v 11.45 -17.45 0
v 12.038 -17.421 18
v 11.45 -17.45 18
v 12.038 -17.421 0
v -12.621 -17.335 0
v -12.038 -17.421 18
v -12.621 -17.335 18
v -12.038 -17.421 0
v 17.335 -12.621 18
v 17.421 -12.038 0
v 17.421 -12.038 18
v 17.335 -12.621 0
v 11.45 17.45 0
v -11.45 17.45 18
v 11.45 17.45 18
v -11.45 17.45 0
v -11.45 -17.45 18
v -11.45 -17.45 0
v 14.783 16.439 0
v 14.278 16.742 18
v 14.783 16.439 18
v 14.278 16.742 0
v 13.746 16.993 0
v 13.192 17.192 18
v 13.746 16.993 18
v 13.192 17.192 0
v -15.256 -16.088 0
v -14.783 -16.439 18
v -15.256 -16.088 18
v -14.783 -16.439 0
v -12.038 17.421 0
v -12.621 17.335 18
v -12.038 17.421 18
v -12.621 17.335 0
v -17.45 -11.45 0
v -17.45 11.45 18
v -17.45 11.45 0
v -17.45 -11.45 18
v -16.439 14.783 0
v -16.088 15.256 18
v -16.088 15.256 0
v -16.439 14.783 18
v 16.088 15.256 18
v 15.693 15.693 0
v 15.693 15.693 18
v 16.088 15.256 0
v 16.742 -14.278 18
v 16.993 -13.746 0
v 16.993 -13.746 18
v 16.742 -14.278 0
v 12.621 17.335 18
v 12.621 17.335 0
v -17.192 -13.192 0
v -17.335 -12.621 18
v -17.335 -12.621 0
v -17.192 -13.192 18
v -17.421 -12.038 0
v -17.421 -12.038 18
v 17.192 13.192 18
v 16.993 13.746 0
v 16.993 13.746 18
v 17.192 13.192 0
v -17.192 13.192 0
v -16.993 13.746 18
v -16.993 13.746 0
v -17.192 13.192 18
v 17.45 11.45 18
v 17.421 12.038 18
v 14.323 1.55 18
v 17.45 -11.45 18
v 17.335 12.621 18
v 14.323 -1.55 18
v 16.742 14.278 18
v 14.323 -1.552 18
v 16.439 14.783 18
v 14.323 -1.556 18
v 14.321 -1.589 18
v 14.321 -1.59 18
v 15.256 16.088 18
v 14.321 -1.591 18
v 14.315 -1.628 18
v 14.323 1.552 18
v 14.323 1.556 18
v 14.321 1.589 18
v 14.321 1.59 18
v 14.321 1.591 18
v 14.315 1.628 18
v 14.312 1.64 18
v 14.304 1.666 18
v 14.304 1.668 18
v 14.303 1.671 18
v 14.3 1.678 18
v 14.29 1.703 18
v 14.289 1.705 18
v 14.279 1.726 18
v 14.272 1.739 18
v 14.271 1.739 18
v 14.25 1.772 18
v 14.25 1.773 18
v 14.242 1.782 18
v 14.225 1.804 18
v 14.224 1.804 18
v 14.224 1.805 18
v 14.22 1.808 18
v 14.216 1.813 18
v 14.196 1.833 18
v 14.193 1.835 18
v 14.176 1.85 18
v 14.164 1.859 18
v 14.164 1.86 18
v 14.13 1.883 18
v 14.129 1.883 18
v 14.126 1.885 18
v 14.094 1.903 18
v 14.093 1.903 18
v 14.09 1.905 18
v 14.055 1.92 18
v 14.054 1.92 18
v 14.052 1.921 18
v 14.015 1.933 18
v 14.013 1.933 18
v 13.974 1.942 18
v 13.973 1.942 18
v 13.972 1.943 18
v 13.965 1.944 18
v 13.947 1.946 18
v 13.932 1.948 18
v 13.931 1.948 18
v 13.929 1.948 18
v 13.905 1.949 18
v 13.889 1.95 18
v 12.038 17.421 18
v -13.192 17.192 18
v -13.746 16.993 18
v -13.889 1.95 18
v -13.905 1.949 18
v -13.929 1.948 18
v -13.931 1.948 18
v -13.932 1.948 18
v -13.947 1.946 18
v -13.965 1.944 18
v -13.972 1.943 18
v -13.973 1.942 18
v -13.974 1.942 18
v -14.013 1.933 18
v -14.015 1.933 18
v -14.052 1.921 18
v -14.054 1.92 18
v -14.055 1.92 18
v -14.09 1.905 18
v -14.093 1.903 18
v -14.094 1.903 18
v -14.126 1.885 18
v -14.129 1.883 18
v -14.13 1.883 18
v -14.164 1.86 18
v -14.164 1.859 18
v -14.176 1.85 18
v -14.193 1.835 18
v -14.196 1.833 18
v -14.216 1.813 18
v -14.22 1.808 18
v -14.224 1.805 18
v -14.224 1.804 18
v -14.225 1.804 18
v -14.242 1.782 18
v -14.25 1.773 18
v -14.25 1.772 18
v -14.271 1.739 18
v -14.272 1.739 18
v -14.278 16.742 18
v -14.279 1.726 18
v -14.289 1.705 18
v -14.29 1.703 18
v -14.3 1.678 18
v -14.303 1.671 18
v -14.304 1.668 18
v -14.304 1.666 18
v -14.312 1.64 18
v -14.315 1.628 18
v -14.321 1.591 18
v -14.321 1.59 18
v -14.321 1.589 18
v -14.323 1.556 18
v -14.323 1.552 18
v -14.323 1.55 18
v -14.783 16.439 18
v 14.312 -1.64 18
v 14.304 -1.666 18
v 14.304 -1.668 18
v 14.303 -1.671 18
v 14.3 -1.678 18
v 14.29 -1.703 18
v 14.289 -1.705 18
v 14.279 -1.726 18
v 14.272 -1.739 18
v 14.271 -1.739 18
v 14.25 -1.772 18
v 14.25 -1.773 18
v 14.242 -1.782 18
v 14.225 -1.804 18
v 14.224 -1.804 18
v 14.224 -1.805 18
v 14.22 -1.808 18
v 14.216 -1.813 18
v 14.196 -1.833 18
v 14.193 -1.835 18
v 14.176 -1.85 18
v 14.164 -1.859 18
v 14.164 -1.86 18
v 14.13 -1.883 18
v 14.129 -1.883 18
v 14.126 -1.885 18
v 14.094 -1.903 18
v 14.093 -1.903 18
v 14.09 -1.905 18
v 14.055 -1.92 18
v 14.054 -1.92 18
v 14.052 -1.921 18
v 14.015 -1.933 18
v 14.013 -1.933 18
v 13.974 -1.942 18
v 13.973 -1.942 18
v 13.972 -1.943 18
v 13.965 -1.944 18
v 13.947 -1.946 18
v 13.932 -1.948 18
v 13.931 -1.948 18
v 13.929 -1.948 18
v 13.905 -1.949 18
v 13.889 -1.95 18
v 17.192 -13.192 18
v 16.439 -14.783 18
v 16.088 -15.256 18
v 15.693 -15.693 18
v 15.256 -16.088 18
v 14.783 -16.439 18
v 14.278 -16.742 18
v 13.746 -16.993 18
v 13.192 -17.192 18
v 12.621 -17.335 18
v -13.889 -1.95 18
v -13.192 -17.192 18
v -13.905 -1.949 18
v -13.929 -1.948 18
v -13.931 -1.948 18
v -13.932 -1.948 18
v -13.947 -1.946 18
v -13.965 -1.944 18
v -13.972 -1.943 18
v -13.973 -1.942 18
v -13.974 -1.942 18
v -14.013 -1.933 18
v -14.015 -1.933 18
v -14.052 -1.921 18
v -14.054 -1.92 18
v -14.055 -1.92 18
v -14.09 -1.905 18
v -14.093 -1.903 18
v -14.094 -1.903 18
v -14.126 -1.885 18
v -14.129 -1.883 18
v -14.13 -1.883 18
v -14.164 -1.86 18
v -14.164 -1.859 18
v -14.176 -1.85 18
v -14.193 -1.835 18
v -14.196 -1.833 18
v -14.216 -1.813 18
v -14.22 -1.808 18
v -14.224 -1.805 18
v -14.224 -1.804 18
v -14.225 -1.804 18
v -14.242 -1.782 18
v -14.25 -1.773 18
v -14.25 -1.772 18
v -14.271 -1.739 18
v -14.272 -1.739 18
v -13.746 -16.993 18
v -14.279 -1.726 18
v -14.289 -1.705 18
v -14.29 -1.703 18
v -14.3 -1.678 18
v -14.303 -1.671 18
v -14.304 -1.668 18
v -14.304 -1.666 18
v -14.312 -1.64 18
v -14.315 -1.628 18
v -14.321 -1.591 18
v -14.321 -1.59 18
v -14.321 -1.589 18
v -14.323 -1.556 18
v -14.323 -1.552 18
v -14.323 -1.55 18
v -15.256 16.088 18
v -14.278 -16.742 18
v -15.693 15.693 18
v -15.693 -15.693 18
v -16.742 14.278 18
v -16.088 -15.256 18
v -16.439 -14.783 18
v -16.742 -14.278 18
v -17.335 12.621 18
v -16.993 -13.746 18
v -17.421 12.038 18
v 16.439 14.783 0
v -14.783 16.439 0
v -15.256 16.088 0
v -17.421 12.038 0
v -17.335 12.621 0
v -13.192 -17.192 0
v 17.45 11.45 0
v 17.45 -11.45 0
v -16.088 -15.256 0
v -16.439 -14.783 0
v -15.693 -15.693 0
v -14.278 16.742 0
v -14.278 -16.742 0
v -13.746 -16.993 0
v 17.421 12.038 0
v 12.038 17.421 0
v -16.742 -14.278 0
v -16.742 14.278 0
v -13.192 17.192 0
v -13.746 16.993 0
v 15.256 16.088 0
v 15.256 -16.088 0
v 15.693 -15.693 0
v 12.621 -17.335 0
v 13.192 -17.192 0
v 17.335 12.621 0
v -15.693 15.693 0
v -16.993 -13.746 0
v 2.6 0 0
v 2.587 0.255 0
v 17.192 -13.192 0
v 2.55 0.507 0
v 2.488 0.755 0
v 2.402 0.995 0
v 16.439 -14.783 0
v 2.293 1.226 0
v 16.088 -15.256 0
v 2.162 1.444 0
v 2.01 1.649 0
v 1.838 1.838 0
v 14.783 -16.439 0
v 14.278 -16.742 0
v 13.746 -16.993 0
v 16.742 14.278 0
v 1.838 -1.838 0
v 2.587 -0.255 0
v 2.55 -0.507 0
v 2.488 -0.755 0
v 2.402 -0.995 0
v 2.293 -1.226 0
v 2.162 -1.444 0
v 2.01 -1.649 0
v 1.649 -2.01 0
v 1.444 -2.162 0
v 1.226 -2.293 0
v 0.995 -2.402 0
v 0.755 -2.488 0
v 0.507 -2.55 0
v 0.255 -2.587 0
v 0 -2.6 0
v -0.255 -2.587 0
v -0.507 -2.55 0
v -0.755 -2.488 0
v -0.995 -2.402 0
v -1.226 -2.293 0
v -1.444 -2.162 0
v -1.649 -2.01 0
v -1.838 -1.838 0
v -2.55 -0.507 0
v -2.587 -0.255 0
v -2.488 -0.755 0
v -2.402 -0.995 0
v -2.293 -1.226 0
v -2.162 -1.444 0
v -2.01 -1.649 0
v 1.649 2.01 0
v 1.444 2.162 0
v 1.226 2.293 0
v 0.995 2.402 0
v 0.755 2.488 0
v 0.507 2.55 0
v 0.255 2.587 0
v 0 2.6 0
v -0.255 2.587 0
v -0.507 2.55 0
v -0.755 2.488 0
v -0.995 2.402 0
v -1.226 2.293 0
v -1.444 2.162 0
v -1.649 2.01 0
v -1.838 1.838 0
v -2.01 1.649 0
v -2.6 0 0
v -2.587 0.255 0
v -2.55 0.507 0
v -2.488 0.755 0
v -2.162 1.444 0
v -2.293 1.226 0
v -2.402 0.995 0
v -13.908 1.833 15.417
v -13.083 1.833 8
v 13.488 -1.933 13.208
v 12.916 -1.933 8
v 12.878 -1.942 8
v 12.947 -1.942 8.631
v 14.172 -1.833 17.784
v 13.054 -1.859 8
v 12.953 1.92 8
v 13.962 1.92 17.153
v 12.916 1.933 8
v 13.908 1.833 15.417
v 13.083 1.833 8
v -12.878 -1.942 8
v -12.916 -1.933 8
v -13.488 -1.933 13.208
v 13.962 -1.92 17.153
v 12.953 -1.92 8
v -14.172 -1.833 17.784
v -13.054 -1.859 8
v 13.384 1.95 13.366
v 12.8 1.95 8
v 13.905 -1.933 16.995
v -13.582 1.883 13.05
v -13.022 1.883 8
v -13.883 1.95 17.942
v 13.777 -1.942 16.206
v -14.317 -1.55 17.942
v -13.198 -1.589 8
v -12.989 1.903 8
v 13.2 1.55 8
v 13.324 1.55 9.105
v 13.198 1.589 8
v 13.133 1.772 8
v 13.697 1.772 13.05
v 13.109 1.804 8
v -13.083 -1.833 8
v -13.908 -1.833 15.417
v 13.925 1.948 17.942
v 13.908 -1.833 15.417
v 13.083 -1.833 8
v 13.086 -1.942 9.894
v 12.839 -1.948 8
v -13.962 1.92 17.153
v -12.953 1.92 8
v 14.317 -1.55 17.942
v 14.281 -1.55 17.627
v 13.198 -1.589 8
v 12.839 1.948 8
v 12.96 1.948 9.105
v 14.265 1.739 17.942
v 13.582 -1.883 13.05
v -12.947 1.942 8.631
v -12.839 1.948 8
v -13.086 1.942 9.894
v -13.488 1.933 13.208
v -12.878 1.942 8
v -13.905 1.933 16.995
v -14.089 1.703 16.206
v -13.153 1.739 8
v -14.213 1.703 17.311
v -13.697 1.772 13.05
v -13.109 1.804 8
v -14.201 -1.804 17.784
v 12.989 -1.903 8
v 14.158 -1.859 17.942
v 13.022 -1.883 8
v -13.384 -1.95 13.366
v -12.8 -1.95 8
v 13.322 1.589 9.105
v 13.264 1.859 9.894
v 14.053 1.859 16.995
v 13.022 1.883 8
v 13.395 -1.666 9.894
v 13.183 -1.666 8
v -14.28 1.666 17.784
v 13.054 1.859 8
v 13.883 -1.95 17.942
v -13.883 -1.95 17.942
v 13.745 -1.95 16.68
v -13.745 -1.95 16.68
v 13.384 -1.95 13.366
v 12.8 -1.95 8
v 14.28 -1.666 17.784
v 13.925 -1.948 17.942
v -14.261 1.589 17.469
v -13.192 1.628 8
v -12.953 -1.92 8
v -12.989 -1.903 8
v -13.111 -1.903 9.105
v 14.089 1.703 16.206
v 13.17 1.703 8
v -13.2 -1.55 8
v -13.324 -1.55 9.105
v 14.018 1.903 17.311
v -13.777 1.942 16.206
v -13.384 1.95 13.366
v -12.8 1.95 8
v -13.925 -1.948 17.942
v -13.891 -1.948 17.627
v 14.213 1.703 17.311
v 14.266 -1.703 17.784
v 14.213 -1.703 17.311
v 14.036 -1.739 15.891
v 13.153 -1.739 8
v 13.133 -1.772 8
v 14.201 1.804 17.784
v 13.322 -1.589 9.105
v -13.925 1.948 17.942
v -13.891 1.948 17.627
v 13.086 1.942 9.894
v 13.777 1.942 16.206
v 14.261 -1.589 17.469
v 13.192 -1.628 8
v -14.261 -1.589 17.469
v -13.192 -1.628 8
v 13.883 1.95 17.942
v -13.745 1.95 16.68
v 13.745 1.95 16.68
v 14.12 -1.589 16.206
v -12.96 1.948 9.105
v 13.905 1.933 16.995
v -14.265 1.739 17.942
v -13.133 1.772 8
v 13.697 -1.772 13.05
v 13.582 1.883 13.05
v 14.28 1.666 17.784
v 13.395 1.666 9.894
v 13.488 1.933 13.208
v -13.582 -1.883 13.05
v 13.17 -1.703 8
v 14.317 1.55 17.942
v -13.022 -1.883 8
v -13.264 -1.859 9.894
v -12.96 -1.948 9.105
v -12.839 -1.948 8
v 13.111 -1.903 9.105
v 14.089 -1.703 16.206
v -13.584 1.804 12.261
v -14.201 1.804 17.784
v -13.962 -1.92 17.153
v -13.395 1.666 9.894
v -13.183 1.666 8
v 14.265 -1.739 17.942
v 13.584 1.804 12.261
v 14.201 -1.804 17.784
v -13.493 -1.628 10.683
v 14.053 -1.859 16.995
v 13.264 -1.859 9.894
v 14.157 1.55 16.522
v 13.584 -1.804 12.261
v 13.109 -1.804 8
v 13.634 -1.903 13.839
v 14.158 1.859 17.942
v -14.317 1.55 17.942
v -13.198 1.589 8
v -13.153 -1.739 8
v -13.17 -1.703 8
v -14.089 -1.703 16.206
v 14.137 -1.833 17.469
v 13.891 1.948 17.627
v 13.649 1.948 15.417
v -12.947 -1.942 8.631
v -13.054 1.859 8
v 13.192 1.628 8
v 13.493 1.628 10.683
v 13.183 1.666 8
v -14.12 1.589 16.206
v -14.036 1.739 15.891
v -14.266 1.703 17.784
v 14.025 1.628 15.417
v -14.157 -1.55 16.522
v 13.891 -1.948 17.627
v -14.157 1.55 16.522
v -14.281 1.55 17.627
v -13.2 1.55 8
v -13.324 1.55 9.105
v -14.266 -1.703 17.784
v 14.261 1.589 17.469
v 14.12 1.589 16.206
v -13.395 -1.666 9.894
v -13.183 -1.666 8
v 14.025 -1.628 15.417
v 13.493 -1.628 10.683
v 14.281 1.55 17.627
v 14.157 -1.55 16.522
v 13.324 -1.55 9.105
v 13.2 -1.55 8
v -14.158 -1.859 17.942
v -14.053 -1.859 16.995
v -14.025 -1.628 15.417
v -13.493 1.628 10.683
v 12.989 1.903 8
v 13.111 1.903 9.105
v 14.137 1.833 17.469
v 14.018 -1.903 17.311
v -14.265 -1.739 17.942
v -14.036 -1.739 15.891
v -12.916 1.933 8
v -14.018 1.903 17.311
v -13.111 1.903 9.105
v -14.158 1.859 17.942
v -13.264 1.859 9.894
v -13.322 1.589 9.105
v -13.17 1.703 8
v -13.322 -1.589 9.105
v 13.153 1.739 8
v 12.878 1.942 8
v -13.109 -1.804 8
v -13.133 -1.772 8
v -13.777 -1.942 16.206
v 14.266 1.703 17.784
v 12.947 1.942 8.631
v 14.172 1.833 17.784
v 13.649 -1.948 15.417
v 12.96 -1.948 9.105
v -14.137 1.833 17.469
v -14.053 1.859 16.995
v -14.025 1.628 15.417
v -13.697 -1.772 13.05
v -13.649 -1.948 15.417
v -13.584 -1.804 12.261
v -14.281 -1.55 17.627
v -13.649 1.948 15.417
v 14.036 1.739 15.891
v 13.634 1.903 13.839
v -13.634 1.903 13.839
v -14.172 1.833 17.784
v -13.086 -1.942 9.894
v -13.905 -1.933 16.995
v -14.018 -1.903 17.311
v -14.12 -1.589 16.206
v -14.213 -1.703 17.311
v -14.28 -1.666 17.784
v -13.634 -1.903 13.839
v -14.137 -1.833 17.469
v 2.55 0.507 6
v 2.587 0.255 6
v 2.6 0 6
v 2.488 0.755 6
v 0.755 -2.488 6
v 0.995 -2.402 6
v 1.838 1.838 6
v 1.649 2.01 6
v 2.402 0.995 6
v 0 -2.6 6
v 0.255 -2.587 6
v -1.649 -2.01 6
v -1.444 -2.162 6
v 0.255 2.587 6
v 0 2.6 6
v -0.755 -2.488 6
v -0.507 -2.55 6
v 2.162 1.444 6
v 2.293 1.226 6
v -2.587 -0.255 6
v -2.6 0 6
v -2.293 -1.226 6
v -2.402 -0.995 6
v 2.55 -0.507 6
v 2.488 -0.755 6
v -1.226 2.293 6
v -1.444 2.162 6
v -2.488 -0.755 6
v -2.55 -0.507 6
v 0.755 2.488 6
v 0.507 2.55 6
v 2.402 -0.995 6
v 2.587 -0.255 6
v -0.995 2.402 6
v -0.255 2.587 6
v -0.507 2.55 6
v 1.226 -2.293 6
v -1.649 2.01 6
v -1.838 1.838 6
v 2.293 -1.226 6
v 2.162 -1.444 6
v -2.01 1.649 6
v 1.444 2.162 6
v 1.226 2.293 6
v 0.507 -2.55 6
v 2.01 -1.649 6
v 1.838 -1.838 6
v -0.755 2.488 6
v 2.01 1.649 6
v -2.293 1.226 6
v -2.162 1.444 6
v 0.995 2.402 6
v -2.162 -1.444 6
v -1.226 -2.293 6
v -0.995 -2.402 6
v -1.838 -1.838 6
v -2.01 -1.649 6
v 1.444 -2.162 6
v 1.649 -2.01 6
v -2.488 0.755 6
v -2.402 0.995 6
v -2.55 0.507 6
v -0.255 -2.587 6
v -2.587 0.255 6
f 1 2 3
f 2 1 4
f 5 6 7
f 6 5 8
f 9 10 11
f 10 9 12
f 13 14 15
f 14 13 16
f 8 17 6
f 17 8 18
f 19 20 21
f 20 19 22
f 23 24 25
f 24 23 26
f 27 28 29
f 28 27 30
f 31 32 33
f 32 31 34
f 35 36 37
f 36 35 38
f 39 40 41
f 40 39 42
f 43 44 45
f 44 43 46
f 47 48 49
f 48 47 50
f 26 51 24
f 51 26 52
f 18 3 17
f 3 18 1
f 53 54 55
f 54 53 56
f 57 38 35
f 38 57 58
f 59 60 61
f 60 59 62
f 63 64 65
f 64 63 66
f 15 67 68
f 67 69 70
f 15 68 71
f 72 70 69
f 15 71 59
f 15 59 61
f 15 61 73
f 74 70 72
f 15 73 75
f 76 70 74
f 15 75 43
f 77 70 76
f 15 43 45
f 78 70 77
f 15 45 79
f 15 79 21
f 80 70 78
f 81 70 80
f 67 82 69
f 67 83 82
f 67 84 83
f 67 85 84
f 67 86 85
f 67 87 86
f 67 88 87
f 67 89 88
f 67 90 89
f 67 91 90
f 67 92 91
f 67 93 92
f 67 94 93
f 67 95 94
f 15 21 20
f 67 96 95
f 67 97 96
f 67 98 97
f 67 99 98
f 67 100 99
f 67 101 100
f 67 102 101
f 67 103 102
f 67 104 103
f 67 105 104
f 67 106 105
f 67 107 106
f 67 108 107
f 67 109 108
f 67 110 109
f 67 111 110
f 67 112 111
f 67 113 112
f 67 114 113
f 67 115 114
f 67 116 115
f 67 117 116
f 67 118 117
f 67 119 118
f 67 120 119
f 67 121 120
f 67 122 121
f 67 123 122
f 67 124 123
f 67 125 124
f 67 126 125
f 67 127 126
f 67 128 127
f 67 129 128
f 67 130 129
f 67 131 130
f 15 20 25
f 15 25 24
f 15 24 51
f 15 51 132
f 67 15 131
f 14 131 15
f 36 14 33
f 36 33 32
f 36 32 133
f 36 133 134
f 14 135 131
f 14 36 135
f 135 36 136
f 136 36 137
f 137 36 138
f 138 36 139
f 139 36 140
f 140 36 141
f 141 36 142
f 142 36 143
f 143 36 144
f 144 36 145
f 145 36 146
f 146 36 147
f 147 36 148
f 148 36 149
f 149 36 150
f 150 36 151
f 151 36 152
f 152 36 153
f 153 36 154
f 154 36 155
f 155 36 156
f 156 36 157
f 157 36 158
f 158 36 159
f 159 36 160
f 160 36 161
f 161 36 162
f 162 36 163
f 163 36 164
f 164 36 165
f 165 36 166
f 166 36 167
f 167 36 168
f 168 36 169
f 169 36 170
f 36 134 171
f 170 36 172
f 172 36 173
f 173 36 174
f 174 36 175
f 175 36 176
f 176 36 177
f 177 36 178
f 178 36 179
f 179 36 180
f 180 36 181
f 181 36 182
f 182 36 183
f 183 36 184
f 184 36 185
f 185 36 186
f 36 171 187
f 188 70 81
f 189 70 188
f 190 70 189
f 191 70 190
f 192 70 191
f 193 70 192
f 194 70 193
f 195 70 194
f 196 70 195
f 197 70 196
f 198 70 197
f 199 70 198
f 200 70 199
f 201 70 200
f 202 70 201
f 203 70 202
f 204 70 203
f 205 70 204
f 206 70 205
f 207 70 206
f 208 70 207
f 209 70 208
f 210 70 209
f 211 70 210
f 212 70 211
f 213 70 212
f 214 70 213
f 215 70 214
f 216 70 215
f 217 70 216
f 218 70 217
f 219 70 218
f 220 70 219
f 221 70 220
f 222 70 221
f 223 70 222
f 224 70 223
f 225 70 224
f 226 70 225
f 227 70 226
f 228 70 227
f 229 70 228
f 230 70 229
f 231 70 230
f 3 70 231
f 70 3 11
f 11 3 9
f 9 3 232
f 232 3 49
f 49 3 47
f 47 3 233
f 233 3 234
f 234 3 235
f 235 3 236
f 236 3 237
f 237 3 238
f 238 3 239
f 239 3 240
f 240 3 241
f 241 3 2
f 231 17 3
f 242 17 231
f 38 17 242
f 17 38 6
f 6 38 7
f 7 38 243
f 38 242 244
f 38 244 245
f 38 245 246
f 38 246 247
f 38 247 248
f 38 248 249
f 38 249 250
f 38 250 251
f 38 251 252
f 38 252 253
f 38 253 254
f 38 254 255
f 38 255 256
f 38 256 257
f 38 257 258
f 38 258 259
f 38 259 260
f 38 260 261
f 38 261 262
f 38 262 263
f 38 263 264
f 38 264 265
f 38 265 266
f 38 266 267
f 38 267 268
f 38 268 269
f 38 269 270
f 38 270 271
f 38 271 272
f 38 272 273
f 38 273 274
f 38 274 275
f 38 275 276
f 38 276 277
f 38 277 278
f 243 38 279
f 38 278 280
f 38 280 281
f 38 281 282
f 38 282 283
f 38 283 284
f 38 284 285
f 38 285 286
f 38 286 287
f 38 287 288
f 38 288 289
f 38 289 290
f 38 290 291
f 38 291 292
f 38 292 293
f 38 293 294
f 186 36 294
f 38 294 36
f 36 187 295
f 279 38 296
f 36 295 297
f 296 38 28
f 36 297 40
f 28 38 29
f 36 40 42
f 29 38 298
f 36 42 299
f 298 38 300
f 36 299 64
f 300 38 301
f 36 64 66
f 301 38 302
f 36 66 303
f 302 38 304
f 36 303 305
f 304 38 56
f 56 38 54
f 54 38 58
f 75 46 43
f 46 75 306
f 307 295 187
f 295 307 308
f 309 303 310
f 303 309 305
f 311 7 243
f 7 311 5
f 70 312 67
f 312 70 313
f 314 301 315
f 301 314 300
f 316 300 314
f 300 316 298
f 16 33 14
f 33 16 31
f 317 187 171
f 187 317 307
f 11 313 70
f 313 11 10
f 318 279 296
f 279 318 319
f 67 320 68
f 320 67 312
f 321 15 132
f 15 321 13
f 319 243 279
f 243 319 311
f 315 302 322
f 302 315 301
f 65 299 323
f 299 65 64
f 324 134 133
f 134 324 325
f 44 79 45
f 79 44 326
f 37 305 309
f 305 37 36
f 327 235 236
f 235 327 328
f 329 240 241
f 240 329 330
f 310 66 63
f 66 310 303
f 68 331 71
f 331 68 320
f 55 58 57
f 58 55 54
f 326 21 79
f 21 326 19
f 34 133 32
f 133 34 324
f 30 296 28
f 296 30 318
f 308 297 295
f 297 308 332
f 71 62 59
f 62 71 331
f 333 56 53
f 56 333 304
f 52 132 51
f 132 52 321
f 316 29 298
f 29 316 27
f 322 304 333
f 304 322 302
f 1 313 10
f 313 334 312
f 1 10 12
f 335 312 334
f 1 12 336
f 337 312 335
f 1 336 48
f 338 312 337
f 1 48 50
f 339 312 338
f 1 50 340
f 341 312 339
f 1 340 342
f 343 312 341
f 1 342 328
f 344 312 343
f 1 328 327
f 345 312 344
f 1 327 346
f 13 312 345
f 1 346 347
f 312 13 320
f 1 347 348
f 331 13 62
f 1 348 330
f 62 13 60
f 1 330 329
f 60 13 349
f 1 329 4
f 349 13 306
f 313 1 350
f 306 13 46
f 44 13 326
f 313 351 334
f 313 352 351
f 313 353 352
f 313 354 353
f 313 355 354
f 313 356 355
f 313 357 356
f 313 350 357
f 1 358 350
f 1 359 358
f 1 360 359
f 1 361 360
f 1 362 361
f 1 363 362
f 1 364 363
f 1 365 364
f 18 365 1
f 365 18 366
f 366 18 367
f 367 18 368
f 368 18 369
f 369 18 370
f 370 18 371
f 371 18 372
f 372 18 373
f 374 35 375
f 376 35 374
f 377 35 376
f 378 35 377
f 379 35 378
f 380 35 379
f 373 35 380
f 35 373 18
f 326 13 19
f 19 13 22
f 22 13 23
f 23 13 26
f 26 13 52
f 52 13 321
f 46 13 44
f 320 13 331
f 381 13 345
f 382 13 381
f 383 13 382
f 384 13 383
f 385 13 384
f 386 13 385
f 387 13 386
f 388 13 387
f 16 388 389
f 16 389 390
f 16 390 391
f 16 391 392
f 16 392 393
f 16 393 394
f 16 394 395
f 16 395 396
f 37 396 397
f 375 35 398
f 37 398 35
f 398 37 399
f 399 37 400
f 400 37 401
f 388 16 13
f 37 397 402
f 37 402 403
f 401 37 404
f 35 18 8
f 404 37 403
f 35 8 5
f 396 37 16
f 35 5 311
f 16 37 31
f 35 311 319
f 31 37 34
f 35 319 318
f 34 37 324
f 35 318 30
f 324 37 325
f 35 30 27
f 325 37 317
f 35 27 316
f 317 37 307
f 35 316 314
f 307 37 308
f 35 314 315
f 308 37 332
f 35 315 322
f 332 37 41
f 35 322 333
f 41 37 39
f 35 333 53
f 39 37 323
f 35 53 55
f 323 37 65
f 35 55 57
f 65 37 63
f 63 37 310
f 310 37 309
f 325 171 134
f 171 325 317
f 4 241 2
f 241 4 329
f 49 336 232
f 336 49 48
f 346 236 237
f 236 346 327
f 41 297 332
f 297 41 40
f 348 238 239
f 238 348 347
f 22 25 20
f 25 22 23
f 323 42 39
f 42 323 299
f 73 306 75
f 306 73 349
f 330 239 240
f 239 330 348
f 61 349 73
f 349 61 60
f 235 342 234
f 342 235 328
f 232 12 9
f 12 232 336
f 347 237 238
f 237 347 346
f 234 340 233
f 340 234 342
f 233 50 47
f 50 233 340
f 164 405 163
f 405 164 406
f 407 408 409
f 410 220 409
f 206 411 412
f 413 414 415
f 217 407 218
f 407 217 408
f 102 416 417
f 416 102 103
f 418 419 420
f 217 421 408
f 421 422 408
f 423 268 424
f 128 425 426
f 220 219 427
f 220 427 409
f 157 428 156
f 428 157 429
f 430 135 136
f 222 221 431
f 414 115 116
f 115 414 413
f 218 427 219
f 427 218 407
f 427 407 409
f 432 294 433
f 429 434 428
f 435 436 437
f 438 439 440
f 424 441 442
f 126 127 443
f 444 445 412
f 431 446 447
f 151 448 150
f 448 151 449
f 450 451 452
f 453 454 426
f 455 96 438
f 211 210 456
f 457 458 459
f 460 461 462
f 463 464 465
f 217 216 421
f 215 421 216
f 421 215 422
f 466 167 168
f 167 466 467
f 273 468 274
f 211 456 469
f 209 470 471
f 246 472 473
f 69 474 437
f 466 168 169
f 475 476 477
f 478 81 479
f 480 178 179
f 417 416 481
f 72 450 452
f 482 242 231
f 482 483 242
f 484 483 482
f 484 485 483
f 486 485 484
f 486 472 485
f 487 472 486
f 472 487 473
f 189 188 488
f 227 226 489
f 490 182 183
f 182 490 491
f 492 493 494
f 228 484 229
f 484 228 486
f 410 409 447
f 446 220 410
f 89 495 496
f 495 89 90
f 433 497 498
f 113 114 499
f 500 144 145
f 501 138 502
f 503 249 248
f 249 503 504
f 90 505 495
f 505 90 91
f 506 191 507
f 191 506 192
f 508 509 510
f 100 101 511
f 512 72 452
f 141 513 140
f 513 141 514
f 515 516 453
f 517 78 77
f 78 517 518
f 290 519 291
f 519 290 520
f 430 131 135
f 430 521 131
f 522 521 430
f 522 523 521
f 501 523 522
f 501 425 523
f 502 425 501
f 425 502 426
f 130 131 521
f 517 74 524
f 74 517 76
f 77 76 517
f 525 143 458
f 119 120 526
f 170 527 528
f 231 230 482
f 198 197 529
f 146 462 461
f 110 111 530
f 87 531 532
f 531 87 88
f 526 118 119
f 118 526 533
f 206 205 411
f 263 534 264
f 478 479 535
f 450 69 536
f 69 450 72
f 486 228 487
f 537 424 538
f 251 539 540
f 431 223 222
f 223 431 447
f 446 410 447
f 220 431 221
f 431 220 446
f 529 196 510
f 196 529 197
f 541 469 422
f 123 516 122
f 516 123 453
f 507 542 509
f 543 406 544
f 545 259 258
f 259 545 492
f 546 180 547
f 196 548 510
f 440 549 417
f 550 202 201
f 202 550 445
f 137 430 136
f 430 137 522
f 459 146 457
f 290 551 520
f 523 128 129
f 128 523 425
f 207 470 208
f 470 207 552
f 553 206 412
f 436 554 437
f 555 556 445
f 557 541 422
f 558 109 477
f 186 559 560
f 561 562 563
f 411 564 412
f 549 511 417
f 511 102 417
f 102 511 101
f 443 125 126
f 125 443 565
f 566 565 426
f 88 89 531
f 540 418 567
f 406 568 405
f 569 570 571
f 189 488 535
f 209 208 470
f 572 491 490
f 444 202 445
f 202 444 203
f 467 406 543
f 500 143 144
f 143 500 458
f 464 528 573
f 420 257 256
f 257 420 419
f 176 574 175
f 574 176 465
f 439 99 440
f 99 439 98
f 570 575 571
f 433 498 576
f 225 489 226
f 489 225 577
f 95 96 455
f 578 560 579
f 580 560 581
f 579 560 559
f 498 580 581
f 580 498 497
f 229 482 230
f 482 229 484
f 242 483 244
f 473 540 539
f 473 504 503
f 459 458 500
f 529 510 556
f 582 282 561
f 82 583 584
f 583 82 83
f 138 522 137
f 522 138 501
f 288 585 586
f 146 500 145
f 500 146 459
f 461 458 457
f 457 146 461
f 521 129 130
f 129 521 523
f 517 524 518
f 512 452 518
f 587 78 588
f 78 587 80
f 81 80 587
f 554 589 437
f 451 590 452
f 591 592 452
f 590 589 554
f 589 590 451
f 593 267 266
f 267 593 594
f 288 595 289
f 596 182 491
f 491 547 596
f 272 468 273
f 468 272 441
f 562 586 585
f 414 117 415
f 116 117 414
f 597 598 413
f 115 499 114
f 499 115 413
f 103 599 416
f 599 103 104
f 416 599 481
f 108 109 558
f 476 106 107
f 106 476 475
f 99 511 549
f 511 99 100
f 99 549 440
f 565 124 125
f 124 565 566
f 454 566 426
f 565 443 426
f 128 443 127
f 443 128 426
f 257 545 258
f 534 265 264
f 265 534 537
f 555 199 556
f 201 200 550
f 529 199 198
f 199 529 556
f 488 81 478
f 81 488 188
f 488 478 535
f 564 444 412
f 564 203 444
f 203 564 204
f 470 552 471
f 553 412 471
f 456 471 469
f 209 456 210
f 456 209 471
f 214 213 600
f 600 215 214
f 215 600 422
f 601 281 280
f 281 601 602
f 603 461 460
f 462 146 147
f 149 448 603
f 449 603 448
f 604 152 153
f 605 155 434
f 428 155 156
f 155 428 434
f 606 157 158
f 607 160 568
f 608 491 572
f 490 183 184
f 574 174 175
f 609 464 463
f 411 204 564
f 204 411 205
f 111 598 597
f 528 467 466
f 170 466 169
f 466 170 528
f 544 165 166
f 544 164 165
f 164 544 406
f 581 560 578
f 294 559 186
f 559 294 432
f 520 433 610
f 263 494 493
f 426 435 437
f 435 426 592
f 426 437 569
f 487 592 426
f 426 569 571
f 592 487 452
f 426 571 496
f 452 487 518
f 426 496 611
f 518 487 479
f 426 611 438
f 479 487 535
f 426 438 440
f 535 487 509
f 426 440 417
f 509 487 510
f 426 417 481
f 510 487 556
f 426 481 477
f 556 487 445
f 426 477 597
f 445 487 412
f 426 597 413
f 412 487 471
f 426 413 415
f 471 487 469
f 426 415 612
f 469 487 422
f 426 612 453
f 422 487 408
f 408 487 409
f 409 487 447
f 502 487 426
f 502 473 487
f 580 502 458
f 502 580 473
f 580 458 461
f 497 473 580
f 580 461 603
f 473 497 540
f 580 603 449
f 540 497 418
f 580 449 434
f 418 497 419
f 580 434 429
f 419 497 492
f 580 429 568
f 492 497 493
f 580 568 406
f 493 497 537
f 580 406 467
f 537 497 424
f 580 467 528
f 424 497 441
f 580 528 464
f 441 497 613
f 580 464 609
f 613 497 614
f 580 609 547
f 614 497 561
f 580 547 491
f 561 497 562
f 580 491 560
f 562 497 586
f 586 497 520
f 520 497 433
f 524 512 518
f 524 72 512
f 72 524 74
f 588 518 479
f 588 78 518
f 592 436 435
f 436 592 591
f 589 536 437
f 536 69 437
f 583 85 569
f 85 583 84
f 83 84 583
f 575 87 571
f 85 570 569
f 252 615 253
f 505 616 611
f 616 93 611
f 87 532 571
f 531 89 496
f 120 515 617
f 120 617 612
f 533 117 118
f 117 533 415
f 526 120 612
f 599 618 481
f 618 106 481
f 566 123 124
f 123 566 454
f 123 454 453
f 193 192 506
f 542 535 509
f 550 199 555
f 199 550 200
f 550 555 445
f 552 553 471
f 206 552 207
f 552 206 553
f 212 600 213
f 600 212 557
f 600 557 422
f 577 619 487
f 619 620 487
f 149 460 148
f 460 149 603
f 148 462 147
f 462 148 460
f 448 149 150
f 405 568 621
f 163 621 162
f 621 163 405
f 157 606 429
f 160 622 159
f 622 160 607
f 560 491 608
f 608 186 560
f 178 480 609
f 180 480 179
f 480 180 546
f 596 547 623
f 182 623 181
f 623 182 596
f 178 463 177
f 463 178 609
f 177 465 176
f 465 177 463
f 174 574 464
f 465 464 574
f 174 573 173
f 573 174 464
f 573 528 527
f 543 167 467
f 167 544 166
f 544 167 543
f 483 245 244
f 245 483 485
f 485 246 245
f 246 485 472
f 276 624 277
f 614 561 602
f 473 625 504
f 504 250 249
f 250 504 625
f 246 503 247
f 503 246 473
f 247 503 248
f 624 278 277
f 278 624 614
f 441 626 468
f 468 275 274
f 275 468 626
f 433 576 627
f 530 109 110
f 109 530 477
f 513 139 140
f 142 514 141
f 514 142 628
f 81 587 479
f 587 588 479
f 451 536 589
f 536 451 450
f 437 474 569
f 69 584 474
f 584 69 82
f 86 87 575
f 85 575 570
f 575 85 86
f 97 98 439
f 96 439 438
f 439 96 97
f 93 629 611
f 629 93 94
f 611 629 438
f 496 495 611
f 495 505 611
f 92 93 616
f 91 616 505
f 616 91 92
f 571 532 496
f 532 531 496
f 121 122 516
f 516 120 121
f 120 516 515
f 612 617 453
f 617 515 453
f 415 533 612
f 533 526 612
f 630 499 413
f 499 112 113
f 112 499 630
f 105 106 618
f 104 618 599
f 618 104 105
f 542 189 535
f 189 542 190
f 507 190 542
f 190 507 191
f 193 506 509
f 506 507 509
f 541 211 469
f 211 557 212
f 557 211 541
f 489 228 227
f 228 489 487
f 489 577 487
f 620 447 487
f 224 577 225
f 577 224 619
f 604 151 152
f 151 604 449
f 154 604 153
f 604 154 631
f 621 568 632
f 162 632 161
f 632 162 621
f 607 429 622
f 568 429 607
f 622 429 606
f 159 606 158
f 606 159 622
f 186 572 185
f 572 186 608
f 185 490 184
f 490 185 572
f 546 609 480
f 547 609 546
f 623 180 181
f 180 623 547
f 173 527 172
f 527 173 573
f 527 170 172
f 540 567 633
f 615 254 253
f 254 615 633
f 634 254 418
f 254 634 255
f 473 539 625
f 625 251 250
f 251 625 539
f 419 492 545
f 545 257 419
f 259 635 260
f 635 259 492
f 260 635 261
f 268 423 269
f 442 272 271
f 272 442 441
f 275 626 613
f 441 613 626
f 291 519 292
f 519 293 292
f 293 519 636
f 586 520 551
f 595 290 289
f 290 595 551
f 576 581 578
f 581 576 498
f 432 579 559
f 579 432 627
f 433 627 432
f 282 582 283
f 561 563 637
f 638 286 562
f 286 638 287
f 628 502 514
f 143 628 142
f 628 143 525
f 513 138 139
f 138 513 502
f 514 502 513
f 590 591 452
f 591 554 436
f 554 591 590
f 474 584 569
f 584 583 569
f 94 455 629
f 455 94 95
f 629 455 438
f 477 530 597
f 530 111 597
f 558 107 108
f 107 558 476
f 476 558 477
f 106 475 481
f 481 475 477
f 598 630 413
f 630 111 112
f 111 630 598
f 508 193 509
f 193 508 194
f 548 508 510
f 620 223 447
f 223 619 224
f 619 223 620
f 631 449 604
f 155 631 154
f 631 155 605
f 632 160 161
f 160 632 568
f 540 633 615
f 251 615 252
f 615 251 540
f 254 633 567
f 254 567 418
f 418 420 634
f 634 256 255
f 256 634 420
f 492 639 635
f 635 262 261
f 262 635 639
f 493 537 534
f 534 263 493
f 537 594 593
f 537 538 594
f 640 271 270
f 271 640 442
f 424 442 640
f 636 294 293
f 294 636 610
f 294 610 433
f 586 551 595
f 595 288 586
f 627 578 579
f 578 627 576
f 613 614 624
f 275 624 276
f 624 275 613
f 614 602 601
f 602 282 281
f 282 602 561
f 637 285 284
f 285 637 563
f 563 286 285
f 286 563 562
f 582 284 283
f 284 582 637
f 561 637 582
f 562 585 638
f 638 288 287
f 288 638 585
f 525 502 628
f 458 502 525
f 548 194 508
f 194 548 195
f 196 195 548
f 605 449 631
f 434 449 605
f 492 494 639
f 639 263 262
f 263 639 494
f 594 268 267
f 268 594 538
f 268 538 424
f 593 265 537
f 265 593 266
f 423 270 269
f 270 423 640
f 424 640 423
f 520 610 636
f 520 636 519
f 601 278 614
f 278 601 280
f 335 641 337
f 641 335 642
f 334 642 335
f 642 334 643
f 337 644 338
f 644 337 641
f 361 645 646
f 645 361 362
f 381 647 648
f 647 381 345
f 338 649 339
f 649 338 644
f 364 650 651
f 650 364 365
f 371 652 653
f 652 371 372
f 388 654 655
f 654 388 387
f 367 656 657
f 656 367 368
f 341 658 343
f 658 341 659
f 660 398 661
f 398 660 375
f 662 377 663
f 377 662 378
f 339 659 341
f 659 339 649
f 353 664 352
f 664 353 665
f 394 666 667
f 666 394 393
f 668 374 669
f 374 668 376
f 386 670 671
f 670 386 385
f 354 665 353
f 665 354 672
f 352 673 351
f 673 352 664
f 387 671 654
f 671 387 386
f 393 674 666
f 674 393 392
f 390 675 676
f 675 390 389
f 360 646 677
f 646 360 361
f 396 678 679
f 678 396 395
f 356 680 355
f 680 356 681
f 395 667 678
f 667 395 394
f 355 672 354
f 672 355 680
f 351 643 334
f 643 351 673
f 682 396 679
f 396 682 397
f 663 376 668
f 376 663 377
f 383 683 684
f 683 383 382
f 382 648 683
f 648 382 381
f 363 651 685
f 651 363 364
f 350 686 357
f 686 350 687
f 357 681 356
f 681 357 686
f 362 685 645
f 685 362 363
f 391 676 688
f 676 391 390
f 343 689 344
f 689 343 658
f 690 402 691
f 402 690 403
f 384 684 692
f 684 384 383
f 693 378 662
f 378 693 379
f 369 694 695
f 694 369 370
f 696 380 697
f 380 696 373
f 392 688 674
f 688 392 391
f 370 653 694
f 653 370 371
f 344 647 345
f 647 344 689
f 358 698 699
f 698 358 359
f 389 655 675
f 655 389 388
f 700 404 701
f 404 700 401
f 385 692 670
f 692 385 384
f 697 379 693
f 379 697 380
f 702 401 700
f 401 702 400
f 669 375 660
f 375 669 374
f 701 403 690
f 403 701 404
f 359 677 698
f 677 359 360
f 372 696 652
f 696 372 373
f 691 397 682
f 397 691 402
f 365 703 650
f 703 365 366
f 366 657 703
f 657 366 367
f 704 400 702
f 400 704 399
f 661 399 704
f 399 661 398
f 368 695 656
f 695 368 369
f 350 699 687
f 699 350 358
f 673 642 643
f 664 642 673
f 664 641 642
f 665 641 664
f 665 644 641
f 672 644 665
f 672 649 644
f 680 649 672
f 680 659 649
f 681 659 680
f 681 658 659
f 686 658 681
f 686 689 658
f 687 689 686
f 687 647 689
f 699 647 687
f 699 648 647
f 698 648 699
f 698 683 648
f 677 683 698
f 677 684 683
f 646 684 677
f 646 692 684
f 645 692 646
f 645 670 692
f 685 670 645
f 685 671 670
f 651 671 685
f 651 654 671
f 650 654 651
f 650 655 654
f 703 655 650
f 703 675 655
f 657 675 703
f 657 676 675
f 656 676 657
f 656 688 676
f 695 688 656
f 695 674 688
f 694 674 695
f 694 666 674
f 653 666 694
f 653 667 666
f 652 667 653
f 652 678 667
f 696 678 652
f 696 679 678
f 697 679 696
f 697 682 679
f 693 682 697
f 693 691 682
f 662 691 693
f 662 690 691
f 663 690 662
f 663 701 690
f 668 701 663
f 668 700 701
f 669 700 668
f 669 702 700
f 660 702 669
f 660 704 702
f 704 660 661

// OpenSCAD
// file: socket.scad
include <params.scad>

// Thumb-turn socket. Knob pocket on top (+Z) tapers from the tip (deep) to the
// base (opening); servo shaft bore on the bottom (-Z).
module thumbturn_socket() {
  c   = fit_clearance;
  ow  = knob_w_base + knob_t + 2*socket_wall;   // outer footprint (use widest)
  oh  = knob_engage + socket_wall + 6;          // total height incl. shaft collar
  difference() {
    // outer body: rounded square prism (R=6 for pedestal clearance)
    linear_extrude(height = oh)
      offset(r = 6) offset(r = -6)
        square([ow, ow], center = true);
    // tapered knob pocket: base (knob_w_base) at the top opening, narrowing to
    // the tip (knob_w_top) at depth. Built tip-square at bottom, scaled up to base.
    translate([0, 0, oh - knob_engage])
      linear_extrude(height = knob_engage + 0.1, scale = [knob_w_base/knob_w_top, 1])
        offset(r = c) square([knob_w_top, knob_t], center = true);
    // servo shaft bore (bottom)
    translate([0, 0, -0.1])
      cylinder(d = servo_shaft_d + c, h = 6 + 0.1);
  }
}
// main file
include <params.scad>
use <socket.scad>
// outer footprint must exceed the widest knob dimension with positive walls
assert(knob_w_base + 2*fit_clearance < knob_w_base + knob_t + 2*socket_wall, "pocket fits outer (Y)");
assert(knob_t + 2*fit_clearance < knob_w_base + knob_t + 2*socket_wall, "pocket fits outer (X)");
thumbturn_socket();
echo("socket_test ok");
